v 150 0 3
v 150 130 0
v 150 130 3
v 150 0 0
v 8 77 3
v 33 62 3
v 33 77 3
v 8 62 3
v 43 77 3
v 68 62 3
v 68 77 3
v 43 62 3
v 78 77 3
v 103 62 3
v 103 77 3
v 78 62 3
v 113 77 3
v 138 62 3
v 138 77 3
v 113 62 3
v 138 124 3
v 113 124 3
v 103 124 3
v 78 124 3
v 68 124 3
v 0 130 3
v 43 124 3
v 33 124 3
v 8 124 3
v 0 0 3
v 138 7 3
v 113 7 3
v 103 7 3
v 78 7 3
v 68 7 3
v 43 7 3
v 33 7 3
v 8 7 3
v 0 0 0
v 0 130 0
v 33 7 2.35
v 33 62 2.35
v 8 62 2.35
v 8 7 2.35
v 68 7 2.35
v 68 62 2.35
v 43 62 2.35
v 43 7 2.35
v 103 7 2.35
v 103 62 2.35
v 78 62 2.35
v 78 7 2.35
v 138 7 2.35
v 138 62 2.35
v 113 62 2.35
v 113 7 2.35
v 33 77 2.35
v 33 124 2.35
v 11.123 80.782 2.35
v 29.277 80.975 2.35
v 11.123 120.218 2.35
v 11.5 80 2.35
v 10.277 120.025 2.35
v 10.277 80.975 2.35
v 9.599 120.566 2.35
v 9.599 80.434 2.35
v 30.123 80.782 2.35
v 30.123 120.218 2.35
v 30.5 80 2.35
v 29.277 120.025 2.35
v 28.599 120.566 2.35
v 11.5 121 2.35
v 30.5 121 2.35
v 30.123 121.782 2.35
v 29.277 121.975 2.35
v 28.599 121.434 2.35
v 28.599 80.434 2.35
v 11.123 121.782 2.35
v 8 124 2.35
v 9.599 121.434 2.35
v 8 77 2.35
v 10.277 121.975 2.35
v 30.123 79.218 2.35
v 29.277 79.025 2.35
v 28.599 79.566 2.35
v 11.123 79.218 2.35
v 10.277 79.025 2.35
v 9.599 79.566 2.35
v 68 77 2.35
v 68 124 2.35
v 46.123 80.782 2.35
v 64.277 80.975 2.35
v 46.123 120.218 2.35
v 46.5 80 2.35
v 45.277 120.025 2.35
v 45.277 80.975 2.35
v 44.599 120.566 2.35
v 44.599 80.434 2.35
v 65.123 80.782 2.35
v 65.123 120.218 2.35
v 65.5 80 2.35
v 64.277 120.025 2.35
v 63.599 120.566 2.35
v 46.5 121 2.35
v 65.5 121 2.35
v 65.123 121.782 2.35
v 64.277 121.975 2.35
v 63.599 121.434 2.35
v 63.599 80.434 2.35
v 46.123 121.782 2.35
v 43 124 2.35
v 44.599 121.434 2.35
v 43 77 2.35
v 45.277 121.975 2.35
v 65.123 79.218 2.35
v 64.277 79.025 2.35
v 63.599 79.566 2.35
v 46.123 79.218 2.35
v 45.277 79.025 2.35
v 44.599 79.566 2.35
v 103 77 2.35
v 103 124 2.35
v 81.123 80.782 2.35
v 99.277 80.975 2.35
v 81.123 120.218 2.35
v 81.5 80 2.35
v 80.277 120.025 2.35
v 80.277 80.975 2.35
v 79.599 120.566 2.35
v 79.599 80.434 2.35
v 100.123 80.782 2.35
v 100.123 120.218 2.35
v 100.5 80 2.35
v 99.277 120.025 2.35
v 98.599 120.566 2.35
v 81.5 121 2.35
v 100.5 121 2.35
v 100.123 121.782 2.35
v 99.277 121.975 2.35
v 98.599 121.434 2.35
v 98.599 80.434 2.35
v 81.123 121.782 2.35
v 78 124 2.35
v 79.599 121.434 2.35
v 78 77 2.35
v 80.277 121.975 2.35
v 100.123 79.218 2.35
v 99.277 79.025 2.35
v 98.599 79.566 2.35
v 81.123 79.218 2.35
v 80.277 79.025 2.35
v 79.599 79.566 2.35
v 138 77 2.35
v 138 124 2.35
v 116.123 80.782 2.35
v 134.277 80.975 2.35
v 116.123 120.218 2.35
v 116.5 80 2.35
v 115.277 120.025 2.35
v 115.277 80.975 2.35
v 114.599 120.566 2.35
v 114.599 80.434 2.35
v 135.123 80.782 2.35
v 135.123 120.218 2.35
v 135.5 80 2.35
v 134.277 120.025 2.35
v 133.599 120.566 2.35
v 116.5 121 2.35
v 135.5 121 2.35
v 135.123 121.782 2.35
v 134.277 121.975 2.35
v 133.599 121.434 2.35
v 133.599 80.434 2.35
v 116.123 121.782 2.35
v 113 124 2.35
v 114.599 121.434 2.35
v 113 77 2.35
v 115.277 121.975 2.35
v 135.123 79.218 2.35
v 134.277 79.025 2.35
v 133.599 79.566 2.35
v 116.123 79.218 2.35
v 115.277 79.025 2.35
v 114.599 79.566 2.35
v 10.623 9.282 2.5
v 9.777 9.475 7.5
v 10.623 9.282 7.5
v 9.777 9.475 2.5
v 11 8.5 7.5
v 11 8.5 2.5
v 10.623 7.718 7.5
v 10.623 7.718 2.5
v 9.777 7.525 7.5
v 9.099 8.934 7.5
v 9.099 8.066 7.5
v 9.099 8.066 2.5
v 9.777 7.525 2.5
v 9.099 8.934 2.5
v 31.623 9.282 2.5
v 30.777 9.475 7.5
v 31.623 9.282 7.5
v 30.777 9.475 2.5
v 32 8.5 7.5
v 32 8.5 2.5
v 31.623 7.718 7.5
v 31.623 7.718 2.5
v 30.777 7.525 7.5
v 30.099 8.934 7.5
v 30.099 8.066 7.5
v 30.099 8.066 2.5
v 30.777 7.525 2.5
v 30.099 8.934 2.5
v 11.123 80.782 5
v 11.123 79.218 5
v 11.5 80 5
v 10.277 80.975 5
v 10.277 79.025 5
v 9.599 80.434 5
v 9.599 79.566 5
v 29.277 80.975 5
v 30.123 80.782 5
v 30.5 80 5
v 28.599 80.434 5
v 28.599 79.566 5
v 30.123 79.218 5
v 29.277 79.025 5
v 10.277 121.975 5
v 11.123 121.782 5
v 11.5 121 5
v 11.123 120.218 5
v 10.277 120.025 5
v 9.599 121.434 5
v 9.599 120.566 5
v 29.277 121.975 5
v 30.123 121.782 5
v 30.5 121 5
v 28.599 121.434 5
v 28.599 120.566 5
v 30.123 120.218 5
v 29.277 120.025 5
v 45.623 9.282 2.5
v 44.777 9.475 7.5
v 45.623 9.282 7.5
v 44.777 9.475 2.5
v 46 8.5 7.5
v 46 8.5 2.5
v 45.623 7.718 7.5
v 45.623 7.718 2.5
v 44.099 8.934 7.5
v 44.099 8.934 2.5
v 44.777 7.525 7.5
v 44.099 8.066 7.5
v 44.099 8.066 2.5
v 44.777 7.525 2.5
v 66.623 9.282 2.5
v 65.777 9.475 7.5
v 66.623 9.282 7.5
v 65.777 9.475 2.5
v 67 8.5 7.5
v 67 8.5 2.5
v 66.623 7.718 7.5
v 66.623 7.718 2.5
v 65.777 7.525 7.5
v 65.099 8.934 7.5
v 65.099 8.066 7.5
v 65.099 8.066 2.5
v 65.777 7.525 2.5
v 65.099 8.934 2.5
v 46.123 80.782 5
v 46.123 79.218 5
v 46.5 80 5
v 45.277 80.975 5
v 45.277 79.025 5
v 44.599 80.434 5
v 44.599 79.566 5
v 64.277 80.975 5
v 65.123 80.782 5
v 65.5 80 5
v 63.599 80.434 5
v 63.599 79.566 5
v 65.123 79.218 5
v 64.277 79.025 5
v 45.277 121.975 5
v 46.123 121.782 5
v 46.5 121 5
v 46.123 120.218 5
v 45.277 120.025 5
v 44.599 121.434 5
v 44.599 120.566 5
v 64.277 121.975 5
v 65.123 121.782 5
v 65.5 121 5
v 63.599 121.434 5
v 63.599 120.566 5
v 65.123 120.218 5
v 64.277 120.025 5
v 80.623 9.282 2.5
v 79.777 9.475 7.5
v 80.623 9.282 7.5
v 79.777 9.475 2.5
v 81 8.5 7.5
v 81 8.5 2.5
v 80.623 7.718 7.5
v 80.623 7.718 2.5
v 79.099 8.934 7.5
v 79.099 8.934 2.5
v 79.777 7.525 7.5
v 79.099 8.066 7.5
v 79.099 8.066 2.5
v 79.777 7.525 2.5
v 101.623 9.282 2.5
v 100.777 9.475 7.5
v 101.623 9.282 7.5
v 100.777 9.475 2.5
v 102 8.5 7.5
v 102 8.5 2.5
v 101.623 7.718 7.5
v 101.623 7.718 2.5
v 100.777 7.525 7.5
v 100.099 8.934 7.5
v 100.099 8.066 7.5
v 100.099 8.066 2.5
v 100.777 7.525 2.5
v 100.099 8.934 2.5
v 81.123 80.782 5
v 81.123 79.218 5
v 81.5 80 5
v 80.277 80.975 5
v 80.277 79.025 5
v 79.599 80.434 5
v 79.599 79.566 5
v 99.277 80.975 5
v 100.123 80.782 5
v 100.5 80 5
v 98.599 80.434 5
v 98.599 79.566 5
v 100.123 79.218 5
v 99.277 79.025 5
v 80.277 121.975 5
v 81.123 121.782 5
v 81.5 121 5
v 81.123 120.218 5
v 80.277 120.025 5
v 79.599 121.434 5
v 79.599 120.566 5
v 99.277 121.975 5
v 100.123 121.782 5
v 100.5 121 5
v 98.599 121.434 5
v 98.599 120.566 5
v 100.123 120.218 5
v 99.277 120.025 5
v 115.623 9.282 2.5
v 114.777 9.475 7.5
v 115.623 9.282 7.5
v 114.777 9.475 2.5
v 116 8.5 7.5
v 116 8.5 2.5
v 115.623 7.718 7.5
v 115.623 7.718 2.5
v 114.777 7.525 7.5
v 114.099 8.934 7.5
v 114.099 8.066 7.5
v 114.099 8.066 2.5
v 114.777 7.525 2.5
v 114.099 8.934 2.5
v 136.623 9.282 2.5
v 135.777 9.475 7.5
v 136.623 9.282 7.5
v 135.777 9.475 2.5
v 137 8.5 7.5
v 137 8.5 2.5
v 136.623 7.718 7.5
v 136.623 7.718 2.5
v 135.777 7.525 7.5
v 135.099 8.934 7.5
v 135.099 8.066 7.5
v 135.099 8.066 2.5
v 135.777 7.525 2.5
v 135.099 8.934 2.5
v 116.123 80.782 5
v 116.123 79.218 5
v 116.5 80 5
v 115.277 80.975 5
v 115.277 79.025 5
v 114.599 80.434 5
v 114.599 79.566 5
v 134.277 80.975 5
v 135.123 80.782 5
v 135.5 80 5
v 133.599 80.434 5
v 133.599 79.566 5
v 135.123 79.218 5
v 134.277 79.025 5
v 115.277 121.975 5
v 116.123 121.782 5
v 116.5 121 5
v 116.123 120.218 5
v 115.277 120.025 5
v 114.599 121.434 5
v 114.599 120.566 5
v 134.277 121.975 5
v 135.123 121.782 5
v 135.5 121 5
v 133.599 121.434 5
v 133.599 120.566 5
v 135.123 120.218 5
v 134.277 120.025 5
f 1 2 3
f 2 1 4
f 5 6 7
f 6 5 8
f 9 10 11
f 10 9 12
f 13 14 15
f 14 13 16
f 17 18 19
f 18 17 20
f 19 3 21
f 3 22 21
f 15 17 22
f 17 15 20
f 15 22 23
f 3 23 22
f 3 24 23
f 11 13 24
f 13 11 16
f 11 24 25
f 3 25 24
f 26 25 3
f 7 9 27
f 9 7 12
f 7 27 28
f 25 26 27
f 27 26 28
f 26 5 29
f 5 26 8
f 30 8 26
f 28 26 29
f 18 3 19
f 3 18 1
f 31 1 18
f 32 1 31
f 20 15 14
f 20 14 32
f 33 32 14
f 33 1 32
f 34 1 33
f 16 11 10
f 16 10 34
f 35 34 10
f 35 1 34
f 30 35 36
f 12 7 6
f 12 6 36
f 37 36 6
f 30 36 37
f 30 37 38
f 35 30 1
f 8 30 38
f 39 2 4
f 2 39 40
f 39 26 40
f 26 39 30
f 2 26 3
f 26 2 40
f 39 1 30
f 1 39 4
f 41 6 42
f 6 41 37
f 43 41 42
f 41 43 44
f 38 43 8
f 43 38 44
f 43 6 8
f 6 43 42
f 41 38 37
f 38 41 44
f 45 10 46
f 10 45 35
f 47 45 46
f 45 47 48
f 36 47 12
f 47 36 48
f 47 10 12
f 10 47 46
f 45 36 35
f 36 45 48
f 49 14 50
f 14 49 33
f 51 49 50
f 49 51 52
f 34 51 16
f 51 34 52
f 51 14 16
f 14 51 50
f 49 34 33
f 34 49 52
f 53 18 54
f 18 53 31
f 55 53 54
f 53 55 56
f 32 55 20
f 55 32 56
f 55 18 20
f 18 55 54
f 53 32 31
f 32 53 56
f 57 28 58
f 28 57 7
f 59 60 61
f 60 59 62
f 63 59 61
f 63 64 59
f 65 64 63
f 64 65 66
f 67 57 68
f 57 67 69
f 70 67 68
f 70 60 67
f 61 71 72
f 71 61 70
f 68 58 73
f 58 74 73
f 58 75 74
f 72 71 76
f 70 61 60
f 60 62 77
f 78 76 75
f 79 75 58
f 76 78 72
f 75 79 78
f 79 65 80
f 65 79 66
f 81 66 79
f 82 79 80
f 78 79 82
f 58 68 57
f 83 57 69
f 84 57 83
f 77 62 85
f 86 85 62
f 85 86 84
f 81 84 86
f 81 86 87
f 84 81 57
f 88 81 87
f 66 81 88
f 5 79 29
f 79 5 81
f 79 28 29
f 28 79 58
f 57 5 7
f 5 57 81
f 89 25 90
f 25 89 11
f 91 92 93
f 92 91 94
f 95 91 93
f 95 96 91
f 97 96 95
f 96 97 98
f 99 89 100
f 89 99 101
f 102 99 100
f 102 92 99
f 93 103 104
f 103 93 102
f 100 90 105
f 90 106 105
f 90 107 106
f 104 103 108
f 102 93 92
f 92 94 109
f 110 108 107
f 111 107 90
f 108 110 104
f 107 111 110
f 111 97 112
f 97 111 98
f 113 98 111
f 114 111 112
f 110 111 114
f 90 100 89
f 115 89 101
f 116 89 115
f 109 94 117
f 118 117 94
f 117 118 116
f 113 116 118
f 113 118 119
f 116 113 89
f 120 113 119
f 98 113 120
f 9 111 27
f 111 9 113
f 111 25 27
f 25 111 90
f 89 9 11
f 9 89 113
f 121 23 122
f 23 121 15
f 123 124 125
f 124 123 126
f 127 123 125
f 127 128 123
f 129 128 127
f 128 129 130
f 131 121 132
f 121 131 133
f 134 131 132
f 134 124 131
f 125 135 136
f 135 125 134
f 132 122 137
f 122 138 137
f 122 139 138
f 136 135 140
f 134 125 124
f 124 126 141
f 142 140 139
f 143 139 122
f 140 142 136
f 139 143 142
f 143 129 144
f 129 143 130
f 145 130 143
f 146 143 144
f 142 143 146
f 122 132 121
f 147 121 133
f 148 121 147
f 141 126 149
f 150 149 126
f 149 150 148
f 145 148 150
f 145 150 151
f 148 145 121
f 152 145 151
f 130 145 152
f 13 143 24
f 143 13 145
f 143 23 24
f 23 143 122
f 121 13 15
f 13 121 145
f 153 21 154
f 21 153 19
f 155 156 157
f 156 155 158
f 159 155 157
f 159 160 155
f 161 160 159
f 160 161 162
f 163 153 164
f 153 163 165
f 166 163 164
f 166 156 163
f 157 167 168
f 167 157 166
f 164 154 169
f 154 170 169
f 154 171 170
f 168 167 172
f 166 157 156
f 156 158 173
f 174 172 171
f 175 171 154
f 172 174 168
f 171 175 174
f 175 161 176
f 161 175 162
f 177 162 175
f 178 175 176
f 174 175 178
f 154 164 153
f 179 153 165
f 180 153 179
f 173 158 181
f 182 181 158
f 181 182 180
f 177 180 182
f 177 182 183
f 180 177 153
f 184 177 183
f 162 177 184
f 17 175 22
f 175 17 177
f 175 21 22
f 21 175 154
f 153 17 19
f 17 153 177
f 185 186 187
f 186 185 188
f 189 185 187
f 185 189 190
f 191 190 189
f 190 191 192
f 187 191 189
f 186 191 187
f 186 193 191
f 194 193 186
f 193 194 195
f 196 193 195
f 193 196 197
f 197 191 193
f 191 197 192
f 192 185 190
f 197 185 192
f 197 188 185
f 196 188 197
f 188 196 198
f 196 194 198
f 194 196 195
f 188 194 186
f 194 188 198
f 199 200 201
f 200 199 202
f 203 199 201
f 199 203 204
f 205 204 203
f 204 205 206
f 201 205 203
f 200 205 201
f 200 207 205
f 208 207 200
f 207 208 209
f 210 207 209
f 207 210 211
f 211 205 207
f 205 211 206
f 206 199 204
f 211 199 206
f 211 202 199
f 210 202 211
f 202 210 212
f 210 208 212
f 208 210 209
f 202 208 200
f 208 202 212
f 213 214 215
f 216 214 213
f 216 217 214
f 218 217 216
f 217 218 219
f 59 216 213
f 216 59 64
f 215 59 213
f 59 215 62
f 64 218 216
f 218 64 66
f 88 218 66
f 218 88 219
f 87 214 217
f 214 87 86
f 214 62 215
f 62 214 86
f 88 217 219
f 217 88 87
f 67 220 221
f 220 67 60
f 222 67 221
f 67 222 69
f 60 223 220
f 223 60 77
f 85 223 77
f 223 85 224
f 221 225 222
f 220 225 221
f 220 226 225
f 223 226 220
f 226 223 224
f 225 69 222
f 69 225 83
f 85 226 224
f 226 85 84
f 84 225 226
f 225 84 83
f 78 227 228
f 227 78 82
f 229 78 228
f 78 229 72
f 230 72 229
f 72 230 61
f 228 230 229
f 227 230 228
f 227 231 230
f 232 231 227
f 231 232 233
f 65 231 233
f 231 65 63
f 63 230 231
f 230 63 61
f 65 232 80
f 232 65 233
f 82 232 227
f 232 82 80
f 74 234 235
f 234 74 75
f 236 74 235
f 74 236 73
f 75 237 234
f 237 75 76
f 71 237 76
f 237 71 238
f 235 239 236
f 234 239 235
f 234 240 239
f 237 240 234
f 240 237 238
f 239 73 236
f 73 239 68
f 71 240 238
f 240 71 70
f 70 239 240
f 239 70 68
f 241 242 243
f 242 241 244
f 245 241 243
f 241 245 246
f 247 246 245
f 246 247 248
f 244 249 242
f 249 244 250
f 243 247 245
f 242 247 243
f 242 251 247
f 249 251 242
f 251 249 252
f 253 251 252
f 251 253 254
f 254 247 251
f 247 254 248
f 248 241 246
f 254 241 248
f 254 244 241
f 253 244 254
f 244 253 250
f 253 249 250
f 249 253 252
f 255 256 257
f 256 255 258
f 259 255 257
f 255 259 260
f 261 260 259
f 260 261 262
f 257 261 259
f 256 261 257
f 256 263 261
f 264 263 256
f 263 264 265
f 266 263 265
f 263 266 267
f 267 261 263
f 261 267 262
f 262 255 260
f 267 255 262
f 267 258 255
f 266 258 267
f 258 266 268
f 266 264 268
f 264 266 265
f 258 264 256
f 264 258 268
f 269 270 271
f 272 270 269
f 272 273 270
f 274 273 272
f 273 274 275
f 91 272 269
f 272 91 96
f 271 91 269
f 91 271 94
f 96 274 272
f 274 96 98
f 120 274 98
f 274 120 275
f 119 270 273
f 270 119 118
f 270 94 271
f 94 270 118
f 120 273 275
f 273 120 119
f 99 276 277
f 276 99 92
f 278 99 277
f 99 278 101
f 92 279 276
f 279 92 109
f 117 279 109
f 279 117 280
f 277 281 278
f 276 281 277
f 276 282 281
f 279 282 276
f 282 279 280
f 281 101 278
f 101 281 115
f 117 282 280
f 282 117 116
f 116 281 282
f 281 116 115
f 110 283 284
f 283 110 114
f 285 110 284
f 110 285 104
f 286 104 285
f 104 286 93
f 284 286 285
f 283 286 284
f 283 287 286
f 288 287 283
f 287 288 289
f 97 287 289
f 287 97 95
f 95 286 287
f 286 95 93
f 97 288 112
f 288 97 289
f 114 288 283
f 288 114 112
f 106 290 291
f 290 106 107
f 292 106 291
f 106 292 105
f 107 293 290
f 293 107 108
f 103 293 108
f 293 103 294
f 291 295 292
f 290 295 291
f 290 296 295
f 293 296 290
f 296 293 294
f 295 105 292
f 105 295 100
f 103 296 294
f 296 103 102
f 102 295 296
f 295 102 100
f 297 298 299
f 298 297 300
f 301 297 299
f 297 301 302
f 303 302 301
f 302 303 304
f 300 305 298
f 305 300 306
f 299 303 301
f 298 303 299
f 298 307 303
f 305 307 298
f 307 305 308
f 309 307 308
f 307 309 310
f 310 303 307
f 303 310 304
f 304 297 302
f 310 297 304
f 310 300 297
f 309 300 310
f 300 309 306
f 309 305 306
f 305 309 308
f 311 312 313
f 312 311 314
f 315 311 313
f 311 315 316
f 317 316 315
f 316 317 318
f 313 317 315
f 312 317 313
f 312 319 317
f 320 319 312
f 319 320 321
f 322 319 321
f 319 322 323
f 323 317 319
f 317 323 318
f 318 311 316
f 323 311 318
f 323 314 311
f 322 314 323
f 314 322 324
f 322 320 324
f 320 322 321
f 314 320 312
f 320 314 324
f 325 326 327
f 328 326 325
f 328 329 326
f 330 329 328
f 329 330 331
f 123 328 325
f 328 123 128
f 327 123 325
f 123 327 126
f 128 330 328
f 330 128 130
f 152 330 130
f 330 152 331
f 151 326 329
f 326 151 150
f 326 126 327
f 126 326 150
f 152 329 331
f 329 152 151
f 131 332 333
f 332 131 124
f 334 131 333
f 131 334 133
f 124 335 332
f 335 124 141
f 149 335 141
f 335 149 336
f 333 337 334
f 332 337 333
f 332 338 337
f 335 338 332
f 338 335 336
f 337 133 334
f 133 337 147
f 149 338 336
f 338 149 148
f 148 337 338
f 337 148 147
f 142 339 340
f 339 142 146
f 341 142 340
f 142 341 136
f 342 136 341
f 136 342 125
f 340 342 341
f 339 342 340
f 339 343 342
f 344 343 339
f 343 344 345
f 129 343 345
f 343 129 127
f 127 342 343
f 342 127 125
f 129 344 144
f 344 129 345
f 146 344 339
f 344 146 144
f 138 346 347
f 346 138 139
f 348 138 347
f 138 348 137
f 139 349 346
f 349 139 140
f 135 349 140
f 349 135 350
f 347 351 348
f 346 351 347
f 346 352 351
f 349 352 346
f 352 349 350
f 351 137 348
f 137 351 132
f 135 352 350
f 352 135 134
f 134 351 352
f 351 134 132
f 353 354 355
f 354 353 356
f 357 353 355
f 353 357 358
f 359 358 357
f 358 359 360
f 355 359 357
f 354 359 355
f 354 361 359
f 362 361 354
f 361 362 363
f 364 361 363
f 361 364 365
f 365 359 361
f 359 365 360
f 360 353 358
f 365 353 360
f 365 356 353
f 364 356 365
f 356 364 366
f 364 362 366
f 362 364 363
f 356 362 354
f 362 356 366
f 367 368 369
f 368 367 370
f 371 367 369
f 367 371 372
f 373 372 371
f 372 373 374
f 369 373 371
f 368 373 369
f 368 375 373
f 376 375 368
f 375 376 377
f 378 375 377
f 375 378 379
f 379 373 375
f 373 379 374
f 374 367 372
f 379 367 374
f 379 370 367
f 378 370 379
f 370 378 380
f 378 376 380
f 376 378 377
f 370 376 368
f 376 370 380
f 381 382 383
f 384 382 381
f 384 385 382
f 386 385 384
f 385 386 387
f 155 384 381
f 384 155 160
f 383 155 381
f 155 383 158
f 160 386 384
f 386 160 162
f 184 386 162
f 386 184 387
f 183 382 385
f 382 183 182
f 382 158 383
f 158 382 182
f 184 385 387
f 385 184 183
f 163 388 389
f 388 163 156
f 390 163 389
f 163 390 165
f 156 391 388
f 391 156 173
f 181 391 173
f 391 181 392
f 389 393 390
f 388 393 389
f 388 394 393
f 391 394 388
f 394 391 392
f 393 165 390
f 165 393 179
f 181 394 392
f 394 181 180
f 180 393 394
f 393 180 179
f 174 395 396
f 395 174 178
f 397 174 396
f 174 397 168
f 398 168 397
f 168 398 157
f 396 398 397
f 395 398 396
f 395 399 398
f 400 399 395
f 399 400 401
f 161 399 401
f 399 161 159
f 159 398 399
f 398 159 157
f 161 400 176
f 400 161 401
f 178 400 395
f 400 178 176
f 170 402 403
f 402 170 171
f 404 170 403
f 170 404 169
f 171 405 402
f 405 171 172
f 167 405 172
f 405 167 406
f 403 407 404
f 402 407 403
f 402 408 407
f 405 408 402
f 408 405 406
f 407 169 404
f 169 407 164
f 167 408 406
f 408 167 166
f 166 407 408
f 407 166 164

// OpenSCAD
$fa=1;$fs=0.1;

// wt32-eth01
// 2.1 holes
// 2.5 width
// 0.2 holes width

// 1.9 sd reader

module wt32eth01(x, y) {
    translate([x, y-0.15, 0.5]) cylinder(r=0.1, h=0.5, center=true);
    translate([x + 2.1, y-0.15, 0.5]) cylinder(r=0.1, h=0.5, center=true);
}

module sdreader(x, y) {
    // SD card reader
    translate([x + 0.05, y + 7, 0]) cylinder(r=0.1, h=0.5);
    translate([x + 1.95, y + 7, 0]) cylinder(r=0.1, h=0.5);
    translate([x + 0.05, y + 7 + 4.1, 0]) cylinder(r=0.1, h=0.5);
    translate([x + 1.95, y + 7 + 4.1, 0]) cylinder(r=0.1, h=0.5);
}

scale([10, 10, 10]) {
    // ground plate
    difference() {
        cube([15,13,0.3]);
        // holes for wt32-eth01 modules
        color("grey") translate([1-0.2, 1-0.3, 0.235]) cube([2.5, 5.5, 0.2]);
        color("grey") translate([1-0.2 + 3.5, 1-0.3, 0.235]) cube([2.5, 5.5, 0.2]);
        color("grey") translate([1-0.2 + 7, 1-0.3, 0.235]) cube([2.5, 5.5, 0.2]);
        color("grey") translate([1-0.2 + 10.5, 1-0.3, 0.235]) cube([2.5, 5.5, 0.2]);
        // holes or sdcard
        color("blue") translate([1-0.2, 7 + 1-0.3, 0.235]) cube([2.5, 4.7, 0.2]);
        color("blue") translate([1-0.2 + 3.5, 7 + 1-0.3, 0.235]) cube([2.5, 4.7, 0.2]);
        color("blue") translate([1-0.2 + 7, 7 + 1-0.3, 0.235]) cube([2.5, 4.7, 0.2]);
        color("blue") translate([1-0.2 + 10.5, 7 + 1-0.3, 0.235]) cube([2.5, 4.7, 0.2]);
    }
    
    wt32eth01(1, 1);
    sdreader(1, 1);
    wt32eth01(4.5, 1);
    sdreader(4.5, 1);
    wt32eth01(8, 1);
    sdreader(8, 1);
    wt32eth01(11.5, 1);
    sdreader(11.5, 1);
}
